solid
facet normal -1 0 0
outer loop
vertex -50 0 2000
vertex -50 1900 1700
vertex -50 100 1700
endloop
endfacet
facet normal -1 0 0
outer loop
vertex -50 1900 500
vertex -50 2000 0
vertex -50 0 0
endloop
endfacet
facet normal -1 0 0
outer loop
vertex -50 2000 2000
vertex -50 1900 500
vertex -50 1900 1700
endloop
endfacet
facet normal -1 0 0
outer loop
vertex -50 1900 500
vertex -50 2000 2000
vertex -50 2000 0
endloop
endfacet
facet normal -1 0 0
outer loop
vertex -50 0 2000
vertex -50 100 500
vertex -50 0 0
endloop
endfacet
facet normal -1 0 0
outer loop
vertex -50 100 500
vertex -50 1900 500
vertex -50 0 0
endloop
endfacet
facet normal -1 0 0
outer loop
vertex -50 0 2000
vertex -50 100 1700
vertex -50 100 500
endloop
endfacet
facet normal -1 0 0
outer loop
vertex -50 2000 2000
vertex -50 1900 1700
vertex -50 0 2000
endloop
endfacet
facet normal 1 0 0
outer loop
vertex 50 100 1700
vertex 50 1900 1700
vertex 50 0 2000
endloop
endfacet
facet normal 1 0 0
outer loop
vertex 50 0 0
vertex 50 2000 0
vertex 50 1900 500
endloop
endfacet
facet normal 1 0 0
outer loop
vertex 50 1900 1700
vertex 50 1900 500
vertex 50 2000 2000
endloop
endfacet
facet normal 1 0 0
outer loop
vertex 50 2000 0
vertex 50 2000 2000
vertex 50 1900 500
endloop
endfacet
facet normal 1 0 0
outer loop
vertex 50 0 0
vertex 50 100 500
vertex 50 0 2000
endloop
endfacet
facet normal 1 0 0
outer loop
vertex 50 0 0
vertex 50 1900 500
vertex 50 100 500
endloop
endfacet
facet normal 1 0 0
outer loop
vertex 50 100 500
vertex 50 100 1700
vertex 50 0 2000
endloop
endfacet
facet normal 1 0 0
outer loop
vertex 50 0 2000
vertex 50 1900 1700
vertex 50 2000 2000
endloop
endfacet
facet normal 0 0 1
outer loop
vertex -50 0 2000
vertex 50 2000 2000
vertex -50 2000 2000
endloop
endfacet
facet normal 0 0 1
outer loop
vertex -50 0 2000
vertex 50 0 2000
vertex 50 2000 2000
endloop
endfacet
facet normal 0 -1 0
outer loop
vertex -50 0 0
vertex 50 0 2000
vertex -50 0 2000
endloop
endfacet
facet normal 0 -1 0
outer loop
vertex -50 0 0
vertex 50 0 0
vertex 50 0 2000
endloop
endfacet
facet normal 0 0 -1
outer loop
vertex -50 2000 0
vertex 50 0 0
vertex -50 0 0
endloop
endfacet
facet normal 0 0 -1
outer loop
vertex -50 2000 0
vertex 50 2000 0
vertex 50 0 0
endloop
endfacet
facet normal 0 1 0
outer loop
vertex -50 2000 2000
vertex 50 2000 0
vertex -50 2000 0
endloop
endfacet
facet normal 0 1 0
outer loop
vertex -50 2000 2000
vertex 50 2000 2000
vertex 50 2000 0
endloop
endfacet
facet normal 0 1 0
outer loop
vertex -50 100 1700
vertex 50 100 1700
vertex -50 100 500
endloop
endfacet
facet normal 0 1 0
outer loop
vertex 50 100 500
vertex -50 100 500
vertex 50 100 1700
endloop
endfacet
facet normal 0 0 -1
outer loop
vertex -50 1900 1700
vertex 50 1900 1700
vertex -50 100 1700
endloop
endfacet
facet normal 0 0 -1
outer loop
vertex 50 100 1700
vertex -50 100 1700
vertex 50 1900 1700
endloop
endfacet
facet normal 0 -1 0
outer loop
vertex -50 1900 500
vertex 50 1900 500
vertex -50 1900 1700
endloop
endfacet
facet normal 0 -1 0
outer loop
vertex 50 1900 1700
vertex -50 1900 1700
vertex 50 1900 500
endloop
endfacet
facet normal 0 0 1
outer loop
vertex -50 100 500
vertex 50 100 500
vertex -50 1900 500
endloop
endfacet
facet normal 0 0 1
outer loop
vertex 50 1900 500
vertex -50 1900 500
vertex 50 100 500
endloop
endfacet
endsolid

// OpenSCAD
// file: ../../../libs/modifiers/diagonalize.scad
include <../basic-dims.scad>

module diagonalize_triangle_sketch(t = section_thickness) {
    x = sin(45) * t;
    y = cos(45) * t;

    polygon([
        [0, y],
        [x, 0],
        [0, -y]
    ]);
}

module diagonalize_triangle(t = section_thickness) {
    rotate([0, 0, 90])
    linear_extrude(section_height)
    diagonalize_triangle_sketch(t);
}

module diagonalize2D() {
    thickness = section_thickness / rt;

    trans = (section_thickness/2)*rt/2;
    len_scale = rt - section_thickness / (rt * section_width);

    rotate([0, 0, 45])
    translate([trans, 0, 0])
    scale([len_scale, 1/rt, 1])
    children();
}


module diagonalize3D(w = section_width, t = section_thickness, edges = "trans") {

    trans = (t/2)*rt/2;
    len_scale = rt - t / (rt * w);

    edge_angle = edges == "cis" ? 270 : 180;
    
    diagonalize_triangle(t/rt);

    translate([-w, w, 0])
    rotate([0, 0, edge_angle]) // 180 For continue, -90 (270) for end
    diagonalize_triangle(t/rt);

    rotate([0, 0, 45])
    translate([0, trans, 0])
    scale([1/rt, len_scale, 1])
    children();
}
// file: ../../../libs/basic-dims.scad
unit = 1000;

section_width = unit;
section_height = unit * 2;
section_thickness = unit * 0.1;

rt = sqrt(2);

//  -- Notes --
//  Z is UP
//  X is FORWARD (out of the screen)
// file: ../../../libs/templates/t_shop-window.scad
include <../basic-dims.scad>
include <../modifiers/diagonalize.scad>

shop_window_total_width = section_width * 2;

shop_window_width = shop_window_total_width * 0.9;
shop_window_height = section_height * 0.6;
shop_window_window_offset_bottom = section_height * 0.25;

shop_window_bar_diam = section_thickness * 0.45;
shop_window_window_padding = (shop_window_total_width - shop_window_width)/2;
bar_x_offset = shop_window_window_padding;
shop_window_num_bars = 8;
shop_window_bar_gap = shop_window_width/(shop_window_num_bars + 1);

module shop_window_sketch() {

    difference() {
        square([shop_window_total_width, section_height]);

        translate([shop_window_total_width/2 - shop_window_width/2, shop_window_window_offset_bottom, 0])
        square([shop_window_width, shop_window_height]);
    }
}

module shop_window() {
    rotate([90, 0, 90])
    translate([0, 0, -section_thickness/2])
    linear_extrude(section_thickness)
    shop_window_sketch();
}

module shop_window_bars() {
    rotate([90, 0, 90])
    for (i = [1 : shop_window_num_bars]) {
        translate([0, 0, -section_thickness/2])
        translate([bar_x_offset + shop_window_bar_gap* i, shop_window_window_offset_bottom, section_thickness/2])
        rotate([-90, 0, 0])
        cylinder(d=shop_window_bar_diam, h = shop_window_height);
    }
}
// main file
include <../../../libs/templates/t_shop-window.scad>

shop_window();  
